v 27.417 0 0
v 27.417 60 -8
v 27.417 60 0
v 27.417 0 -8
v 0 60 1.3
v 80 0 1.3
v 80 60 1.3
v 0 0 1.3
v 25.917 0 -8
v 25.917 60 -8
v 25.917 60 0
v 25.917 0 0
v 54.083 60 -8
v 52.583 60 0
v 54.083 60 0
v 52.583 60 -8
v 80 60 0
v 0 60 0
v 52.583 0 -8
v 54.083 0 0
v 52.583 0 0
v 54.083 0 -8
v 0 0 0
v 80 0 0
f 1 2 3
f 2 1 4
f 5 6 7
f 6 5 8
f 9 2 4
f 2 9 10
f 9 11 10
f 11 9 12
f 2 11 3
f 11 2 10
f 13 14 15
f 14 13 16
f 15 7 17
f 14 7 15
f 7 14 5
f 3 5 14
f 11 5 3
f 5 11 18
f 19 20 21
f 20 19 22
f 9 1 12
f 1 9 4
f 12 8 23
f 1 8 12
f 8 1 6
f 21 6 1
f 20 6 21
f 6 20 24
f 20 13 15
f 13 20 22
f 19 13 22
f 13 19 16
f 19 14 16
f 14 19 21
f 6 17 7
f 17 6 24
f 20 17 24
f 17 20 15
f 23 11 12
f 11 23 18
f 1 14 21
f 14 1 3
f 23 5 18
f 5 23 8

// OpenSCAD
$fn = 32;

// ----------------------------------------------------------------------
// Ribbed panel: 1.3 mm panel
// ----------------------------------------------------------------------

// --- parameters (mm) ---
panel_l = 80;             // panel length, X
panel_w = 60;             // panel width, Y
panel_t = 1.3;            // panel thickness, Z
rib_t = 1.5;              // rib thickness
rib_h = 8;                // rib height below the panel
ribs = 2;                 // number of ribs

total_h = panel_t + rib_h;  // overall height

union() {
  cube([panel_l, panel_w, panel_t]);
  for (i = [1 : ribs])
    translate([i * panel_l / (ribs + 1) - rib_t / 2, 0, -rib_h])
      cube([rib_t, panel_w, rib_h + panel_t]);
}
